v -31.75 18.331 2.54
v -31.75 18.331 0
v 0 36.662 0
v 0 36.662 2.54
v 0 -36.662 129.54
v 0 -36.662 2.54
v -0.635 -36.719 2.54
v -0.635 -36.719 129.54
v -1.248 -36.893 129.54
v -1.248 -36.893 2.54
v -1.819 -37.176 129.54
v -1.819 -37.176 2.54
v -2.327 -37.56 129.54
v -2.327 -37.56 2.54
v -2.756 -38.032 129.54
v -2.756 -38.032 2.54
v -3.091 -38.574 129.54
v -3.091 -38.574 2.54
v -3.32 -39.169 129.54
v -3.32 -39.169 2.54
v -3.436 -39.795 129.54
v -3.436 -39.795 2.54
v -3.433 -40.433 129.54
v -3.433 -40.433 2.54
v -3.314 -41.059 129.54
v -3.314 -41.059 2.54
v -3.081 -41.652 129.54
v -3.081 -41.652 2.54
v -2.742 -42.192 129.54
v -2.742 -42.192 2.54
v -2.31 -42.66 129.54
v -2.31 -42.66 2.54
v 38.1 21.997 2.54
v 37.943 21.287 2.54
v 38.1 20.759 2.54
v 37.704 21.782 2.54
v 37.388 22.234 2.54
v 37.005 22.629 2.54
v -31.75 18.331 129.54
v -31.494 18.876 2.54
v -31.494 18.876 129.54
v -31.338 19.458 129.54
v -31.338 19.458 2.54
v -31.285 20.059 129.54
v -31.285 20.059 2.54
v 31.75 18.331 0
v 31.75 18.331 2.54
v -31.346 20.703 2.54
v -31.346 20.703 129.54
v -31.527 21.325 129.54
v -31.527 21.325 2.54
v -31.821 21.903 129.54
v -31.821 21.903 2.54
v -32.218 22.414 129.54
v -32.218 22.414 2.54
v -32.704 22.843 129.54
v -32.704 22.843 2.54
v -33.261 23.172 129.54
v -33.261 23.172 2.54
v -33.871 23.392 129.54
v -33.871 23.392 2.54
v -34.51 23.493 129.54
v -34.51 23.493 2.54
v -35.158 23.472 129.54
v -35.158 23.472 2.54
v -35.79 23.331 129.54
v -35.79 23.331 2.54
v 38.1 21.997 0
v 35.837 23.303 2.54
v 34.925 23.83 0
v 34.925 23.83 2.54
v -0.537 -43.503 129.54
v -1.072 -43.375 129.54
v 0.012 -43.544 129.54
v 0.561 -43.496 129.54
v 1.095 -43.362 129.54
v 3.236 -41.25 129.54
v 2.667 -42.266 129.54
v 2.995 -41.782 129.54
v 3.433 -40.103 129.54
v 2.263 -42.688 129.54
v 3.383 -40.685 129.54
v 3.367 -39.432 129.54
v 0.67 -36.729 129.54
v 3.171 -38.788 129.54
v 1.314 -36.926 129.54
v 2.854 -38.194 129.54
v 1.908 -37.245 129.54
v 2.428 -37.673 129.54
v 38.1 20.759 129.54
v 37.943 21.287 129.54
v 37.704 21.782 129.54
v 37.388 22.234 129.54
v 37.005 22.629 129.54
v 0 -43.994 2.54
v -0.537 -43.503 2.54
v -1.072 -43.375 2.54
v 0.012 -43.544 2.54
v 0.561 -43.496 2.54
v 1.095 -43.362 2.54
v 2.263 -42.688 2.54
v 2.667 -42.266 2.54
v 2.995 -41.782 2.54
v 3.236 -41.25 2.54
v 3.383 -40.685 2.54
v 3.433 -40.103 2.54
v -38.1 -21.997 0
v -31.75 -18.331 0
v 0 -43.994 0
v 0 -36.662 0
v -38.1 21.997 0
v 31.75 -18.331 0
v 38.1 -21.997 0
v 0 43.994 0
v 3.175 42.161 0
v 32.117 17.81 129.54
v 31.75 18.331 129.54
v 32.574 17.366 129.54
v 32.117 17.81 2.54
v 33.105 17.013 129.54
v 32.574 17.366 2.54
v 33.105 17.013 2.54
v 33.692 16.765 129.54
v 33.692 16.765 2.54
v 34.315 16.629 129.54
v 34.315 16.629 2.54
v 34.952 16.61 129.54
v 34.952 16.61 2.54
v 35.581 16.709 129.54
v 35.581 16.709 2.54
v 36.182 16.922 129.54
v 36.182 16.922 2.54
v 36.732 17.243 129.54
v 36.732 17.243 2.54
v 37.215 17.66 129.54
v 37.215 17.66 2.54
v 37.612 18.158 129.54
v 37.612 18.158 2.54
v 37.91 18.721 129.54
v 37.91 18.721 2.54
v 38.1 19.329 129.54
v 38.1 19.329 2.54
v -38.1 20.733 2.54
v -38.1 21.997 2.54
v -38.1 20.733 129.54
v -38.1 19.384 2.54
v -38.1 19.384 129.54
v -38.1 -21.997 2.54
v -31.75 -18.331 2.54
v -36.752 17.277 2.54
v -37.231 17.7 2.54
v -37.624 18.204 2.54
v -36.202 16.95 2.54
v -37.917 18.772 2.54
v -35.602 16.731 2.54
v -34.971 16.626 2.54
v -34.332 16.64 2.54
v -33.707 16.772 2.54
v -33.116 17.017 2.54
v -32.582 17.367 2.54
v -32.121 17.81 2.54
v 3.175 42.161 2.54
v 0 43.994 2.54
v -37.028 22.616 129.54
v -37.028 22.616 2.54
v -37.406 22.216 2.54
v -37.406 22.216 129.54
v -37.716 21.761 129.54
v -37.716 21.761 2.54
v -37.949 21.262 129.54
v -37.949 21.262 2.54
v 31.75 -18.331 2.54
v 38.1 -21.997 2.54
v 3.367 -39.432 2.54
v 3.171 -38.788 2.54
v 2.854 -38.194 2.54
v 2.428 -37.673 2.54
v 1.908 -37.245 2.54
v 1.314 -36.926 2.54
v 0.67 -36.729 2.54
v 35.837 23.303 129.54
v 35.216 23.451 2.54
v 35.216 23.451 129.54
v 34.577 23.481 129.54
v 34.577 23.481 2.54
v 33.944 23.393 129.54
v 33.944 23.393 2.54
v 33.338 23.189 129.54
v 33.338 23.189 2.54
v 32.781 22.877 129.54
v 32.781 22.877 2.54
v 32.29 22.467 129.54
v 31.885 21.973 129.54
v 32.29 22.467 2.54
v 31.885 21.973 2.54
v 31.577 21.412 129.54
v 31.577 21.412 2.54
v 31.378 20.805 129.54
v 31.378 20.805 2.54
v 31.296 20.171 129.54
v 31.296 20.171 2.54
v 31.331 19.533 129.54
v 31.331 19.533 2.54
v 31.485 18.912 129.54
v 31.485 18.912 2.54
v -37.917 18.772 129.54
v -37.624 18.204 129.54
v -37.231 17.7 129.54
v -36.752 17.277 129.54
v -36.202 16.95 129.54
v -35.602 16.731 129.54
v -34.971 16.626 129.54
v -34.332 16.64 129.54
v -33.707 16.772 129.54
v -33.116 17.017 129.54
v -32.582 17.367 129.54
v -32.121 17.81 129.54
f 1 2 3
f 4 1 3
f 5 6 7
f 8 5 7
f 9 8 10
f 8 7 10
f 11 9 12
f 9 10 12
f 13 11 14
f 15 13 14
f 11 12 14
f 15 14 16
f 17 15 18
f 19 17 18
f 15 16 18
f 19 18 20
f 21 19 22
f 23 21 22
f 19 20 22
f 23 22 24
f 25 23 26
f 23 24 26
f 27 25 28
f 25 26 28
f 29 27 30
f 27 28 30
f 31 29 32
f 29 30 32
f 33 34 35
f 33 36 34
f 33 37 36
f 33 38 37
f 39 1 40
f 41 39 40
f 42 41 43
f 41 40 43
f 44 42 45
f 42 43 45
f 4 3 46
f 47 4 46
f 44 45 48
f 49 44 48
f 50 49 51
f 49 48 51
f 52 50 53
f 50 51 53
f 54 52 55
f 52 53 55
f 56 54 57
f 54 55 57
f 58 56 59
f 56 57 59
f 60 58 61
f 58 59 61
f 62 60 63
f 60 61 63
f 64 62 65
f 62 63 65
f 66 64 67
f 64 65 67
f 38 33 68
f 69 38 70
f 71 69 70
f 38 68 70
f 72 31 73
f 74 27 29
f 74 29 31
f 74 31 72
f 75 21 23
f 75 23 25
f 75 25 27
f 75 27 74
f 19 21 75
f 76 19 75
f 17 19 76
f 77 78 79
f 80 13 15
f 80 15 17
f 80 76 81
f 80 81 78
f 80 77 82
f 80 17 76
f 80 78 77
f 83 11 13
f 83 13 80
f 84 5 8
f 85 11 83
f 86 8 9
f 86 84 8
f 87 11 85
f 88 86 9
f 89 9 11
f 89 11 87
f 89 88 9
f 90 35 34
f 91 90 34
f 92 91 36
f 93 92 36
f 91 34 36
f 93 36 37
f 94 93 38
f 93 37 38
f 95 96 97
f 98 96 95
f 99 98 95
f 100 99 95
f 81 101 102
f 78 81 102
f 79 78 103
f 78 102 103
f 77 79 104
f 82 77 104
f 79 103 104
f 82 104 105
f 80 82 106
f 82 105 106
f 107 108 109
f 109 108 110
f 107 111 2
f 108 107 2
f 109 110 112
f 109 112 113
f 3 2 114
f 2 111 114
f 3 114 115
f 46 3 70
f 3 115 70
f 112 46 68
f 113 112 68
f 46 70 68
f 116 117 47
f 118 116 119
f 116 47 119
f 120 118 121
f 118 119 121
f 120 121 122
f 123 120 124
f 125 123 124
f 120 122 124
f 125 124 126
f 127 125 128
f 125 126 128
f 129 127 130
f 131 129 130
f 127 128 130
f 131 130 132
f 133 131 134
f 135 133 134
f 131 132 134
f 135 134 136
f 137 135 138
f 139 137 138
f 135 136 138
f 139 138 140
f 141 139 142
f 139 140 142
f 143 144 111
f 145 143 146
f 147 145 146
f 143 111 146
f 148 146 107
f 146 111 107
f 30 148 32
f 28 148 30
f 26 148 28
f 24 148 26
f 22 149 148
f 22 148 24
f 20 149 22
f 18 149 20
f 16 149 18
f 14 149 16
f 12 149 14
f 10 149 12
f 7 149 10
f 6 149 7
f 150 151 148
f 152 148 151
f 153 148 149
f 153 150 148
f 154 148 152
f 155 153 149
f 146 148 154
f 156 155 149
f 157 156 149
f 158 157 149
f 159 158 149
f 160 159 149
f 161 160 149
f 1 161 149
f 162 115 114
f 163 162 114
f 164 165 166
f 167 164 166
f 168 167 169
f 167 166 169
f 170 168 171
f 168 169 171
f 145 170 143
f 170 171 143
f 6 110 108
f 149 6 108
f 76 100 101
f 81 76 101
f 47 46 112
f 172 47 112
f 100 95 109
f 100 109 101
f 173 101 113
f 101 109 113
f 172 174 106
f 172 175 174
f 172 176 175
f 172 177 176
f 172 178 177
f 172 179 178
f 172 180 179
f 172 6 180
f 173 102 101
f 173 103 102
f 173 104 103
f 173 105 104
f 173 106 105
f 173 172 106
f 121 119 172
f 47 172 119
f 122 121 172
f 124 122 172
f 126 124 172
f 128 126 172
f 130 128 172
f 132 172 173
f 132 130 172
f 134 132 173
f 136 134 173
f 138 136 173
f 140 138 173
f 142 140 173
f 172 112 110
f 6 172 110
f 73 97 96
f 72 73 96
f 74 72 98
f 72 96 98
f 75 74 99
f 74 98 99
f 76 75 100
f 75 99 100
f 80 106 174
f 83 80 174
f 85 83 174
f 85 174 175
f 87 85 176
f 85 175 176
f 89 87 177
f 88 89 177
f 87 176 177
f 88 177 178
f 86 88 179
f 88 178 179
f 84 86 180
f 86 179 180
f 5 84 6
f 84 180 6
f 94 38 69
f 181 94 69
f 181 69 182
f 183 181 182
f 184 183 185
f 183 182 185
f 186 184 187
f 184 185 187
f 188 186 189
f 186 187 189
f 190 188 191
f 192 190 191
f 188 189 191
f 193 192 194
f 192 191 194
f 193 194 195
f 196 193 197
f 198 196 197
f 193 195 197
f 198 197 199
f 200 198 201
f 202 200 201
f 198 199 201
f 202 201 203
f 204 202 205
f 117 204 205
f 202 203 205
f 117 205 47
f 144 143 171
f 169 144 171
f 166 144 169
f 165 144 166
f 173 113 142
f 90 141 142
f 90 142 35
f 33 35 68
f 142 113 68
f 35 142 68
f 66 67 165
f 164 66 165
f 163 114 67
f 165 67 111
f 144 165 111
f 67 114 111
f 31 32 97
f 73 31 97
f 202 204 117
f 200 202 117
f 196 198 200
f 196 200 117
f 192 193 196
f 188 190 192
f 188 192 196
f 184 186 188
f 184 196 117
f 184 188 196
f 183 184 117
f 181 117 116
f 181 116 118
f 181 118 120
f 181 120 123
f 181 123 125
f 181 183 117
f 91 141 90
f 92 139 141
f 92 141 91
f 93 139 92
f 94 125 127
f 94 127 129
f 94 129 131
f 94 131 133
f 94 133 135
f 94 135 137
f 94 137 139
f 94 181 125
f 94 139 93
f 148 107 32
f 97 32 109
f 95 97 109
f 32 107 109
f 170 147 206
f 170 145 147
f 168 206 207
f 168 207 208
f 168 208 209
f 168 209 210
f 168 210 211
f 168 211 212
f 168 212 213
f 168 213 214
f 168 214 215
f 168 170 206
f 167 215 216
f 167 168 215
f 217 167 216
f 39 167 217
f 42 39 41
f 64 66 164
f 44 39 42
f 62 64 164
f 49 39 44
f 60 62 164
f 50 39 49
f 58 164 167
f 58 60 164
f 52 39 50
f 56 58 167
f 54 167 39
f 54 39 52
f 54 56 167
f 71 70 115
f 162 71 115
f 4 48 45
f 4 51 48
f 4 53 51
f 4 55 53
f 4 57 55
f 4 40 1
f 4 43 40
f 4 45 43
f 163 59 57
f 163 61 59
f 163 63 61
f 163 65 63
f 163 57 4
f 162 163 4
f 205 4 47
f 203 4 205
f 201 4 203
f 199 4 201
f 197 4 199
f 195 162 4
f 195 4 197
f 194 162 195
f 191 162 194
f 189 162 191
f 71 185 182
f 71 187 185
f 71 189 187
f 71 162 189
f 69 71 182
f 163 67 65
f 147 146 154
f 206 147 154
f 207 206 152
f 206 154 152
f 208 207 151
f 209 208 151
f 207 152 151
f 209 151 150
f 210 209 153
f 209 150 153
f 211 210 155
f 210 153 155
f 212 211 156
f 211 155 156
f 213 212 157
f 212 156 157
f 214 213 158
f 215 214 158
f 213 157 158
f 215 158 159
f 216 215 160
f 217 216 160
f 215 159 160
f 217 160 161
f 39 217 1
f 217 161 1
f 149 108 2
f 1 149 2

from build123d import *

# Parameters (mm, degrees)
F1_DEPTH = 2.54
F3_DEPTH = 127


# Not quite as in the source:
# - ends of sketch curves that miss each other by under 0.0002 mm in the source are joined


with BuildPart() as f1:
    # F0 (on Top) → F1 (new body)
    with BuildSketch(Plane.XY):
        Polygon((34.9249995572, 23.8301315939), (3.1749995572, 42.1610026407), (0, 43.994091056), (-38.1000004709, 21.997045528), (-38.1000004709, -21.997045528), (0, -43.994091056), (38.1000004709, -21.997045528), (38.1000004709, 21.997045528), align=None)
        Polygon((0, 36.6617420935), (31.75, 18.3308710468), (31.75, -18.3308710468), (0, -36.6617420935), (-31.75, -18.3308710468), (-31.75, 18.3308710468), align=None, mode=Mode.SUBTRACT)
    extrude(amount=F1_DEPTH)

    # F2 (on face) → F3 (join)
    with BuildSketch(Plane.XY.offset(2.54)):
        with BuildLine():
            ThreePointArc((-38.1000004709, 19.3844549358), (-35.2889631462, 16.6640411269), (-31.75, 18.3308710468))
            ThreePointArc((-31.75, 18.3308710468), (-31.403147802, 19.1639531761), (-31.2848175618, 20.0585649554))
            ThreePointArc((-31.2848175618, 20.0585649554), (-32.7035344951, 22.8425648101), (-35.7897937807, 23.3308439825))
            Line((-35.7897937807, 23.3308439825), (-37.0276020707, 22.616195033))
            ThreePointArc((-37.0276020707, 22.616195033), (-37.7159751418, 21.7610765108), (-38.1000004709, 20.7326749751))
            Line((-38.1000004709, 20.7326749751), (-38.1000004709, 19.3844549358))
        make_face()
        with BuildLine():
            ThreePointArc((35.8374259749, 23.3033424061), (32.0759629522, 22.2291160887), (31.75, 18.3308710468))
            ThreePointArc((31.75, 18.3308710468), (35.2686397989, 16.6449401257), (38.1000004709, 19.329448619))
            Line((38.1000004709, 19.329448619), (38.1000004709, 20.758746518))
            ThreePointArc((38.1000004709, 20.758746518), (37.7036332461, 21.7824533156), (37.0050252462, 22.6292292285))
            Line((37.0050252462, 22.6292292285), (35.8374259749, 23.3033424061))
        make_face()
        with BuildLine():
            ThreePointArc((3.4325778187, -40.1026625239), (2.4277039418, -37.6725121227), (0, -36.6617420935))
            ThreePointArc((0, -36.6617420935), (-3.2193789061, -38.8660080857), (-2.3102066902, -42.6602926015))
            Line((-2.3102066902, -42.6602926015), (-1.0723984002, -43.374941551))
            ThreePointArc((-1.0723984002, -43.374941551), (0.0123424988, -43.5435308567), (1.0949770186, -43.3619057795))
            Line((1.0949770186, -43.3619057795), (2.2625698225, -42.6877957599))
            ThreePointArc((2.2625698225, -42.6877957599), (3.1264590528, -41.5214500837), (3.4325778187, -40.1026625239))
        make_face()
    extrude(amount=F3_DEPTH)


solid = f1.part
